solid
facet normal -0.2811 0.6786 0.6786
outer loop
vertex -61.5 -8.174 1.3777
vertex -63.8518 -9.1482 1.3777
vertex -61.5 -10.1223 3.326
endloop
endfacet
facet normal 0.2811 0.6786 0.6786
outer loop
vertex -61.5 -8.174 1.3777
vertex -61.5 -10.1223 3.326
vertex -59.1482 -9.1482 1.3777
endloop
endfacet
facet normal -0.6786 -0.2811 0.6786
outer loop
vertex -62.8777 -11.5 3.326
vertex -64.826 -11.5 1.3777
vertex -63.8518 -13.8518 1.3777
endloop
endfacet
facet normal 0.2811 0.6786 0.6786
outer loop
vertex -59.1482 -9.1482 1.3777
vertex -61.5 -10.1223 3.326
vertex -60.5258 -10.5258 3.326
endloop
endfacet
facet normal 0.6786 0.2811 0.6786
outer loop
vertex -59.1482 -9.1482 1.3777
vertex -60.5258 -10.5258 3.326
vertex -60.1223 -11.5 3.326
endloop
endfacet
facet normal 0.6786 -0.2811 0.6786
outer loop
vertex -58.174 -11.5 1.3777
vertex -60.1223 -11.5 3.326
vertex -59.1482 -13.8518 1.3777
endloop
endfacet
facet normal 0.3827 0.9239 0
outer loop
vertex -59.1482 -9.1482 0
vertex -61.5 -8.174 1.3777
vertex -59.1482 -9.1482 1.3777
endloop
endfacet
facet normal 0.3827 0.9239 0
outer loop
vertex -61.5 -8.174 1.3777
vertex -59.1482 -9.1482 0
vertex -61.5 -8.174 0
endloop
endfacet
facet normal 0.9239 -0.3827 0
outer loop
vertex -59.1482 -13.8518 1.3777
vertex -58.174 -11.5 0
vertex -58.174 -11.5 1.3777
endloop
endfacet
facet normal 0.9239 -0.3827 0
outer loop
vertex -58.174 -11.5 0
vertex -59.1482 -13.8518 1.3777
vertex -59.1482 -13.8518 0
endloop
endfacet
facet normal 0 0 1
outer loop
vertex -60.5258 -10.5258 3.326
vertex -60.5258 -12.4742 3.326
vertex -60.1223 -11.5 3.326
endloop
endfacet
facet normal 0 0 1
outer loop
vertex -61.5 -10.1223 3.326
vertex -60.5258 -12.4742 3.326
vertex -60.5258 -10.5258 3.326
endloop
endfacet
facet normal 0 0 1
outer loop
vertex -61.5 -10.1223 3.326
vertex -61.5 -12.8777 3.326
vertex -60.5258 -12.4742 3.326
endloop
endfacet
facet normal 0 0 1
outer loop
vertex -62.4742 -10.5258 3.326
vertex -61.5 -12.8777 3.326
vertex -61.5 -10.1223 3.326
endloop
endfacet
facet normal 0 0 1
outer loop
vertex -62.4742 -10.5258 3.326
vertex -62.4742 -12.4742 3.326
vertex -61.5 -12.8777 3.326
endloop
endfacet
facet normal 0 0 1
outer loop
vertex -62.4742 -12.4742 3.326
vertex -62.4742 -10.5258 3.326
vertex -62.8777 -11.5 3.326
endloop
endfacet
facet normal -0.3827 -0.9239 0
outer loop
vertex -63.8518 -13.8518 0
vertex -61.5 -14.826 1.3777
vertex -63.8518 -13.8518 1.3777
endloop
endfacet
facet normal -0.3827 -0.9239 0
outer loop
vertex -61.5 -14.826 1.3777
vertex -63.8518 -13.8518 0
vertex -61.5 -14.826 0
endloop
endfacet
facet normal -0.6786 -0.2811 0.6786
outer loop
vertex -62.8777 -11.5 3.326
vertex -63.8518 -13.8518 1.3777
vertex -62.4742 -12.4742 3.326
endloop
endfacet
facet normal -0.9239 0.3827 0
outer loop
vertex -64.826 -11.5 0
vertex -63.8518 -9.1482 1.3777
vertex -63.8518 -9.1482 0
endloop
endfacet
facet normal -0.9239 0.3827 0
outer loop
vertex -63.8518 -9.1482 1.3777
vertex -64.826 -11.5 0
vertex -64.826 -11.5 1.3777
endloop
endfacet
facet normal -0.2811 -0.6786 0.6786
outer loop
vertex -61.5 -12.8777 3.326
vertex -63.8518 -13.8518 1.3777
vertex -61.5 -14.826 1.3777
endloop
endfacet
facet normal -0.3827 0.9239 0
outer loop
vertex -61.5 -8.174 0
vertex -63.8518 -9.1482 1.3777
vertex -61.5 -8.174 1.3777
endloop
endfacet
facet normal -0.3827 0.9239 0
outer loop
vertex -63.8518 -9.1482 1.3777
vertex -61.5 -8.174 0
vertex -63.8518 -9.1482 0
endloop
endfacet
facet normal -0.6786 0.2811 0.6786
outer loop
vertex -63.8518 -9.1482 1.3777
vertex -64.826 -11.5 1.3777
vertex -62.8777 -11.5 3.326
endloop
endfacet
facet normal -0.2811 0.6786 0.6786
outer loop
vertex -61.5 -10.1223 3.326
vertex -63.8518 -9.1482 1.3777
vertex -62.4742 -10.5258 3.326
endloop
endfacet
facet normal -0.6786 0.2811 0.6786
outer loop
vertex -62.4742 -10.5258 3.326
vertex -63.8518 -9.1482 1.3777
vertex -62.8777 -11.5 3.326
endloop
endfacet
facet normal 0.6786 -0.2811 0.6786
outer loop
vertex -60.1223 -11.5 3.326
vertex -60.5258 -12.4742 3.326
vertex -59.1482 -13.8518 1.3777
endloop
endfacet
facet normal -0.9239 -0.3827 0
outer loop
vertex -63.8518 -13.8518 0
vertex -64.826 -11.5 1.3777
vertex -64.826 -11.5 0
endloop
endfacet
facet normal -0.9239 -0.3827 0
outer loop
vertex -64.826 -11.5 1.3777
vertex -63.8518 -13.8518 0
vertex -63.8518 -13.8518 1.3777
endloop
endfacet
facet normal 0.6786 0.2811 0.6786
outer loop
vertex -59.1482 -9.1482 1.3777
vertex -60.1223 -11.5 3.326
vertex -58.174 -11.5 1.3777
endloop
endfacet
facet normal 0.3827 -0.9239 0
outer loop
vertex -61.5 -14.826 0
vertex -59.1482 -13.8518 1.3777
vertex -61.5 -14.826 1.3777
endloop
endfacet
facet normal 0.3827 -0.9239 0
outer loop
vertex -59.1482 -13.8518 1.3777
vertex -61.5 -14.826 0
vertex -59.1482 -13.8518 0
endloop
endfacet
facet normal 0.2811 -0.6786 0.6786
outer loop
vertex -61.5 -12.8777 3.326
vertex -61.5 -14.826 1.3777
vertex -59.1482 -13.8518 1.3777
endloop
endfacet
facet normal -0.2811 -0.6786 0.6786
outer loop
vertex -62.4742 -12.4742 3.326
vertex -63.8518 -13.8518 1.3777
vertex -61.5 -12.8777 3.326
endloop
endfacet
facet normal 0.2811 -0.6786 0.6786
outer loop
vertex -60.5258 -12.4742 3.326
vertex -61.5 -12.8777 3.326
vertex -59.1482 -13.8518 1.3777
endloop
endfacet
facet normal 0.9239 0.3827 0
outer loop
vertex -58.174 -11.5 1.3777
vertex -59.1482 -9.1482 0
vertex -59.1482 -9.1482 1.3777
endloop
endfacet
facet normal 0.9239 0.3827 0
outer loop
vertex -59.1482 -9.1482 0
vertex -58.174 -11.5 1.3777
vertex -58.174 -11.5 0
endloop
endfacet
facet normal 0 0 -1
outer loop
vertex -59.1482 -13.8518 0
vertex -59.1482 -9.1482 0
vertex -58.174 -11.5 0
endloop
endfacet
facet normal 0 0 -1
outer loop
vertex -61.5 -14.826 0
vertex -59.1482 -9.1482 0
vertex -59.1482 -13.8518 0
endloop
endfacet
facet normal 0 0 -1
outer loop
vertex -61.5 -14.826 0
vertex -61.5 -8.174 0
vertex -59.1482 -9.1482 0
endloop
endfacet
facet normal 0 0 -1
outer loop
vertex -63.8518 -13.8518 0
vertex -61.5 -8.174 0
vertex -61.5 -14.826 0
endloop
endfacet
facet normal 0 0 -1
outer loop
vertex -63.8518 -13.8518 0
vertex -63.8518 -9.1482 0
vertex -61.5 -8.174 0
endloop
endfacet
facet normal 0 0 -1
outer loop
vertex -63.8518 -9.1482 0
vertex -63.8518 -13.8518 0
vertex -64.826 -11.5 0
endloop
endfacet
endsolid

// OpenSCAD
r=0.9;
s=4;

difference() {
	translate([-61.5,-11.5])
		scale([r,r,r])
		minkowski() {
			linear_extrude(height=0.1)
				import("abolish.dxf");
			difference() {
				sphere(r=s,$fn=8);
				translate([-s*3,-s*3,-s*6]) cube([s*6,s*6,s*6]);
			}
		}
	translate([0,0,0.3])  cylinder(2,7,7);
}
